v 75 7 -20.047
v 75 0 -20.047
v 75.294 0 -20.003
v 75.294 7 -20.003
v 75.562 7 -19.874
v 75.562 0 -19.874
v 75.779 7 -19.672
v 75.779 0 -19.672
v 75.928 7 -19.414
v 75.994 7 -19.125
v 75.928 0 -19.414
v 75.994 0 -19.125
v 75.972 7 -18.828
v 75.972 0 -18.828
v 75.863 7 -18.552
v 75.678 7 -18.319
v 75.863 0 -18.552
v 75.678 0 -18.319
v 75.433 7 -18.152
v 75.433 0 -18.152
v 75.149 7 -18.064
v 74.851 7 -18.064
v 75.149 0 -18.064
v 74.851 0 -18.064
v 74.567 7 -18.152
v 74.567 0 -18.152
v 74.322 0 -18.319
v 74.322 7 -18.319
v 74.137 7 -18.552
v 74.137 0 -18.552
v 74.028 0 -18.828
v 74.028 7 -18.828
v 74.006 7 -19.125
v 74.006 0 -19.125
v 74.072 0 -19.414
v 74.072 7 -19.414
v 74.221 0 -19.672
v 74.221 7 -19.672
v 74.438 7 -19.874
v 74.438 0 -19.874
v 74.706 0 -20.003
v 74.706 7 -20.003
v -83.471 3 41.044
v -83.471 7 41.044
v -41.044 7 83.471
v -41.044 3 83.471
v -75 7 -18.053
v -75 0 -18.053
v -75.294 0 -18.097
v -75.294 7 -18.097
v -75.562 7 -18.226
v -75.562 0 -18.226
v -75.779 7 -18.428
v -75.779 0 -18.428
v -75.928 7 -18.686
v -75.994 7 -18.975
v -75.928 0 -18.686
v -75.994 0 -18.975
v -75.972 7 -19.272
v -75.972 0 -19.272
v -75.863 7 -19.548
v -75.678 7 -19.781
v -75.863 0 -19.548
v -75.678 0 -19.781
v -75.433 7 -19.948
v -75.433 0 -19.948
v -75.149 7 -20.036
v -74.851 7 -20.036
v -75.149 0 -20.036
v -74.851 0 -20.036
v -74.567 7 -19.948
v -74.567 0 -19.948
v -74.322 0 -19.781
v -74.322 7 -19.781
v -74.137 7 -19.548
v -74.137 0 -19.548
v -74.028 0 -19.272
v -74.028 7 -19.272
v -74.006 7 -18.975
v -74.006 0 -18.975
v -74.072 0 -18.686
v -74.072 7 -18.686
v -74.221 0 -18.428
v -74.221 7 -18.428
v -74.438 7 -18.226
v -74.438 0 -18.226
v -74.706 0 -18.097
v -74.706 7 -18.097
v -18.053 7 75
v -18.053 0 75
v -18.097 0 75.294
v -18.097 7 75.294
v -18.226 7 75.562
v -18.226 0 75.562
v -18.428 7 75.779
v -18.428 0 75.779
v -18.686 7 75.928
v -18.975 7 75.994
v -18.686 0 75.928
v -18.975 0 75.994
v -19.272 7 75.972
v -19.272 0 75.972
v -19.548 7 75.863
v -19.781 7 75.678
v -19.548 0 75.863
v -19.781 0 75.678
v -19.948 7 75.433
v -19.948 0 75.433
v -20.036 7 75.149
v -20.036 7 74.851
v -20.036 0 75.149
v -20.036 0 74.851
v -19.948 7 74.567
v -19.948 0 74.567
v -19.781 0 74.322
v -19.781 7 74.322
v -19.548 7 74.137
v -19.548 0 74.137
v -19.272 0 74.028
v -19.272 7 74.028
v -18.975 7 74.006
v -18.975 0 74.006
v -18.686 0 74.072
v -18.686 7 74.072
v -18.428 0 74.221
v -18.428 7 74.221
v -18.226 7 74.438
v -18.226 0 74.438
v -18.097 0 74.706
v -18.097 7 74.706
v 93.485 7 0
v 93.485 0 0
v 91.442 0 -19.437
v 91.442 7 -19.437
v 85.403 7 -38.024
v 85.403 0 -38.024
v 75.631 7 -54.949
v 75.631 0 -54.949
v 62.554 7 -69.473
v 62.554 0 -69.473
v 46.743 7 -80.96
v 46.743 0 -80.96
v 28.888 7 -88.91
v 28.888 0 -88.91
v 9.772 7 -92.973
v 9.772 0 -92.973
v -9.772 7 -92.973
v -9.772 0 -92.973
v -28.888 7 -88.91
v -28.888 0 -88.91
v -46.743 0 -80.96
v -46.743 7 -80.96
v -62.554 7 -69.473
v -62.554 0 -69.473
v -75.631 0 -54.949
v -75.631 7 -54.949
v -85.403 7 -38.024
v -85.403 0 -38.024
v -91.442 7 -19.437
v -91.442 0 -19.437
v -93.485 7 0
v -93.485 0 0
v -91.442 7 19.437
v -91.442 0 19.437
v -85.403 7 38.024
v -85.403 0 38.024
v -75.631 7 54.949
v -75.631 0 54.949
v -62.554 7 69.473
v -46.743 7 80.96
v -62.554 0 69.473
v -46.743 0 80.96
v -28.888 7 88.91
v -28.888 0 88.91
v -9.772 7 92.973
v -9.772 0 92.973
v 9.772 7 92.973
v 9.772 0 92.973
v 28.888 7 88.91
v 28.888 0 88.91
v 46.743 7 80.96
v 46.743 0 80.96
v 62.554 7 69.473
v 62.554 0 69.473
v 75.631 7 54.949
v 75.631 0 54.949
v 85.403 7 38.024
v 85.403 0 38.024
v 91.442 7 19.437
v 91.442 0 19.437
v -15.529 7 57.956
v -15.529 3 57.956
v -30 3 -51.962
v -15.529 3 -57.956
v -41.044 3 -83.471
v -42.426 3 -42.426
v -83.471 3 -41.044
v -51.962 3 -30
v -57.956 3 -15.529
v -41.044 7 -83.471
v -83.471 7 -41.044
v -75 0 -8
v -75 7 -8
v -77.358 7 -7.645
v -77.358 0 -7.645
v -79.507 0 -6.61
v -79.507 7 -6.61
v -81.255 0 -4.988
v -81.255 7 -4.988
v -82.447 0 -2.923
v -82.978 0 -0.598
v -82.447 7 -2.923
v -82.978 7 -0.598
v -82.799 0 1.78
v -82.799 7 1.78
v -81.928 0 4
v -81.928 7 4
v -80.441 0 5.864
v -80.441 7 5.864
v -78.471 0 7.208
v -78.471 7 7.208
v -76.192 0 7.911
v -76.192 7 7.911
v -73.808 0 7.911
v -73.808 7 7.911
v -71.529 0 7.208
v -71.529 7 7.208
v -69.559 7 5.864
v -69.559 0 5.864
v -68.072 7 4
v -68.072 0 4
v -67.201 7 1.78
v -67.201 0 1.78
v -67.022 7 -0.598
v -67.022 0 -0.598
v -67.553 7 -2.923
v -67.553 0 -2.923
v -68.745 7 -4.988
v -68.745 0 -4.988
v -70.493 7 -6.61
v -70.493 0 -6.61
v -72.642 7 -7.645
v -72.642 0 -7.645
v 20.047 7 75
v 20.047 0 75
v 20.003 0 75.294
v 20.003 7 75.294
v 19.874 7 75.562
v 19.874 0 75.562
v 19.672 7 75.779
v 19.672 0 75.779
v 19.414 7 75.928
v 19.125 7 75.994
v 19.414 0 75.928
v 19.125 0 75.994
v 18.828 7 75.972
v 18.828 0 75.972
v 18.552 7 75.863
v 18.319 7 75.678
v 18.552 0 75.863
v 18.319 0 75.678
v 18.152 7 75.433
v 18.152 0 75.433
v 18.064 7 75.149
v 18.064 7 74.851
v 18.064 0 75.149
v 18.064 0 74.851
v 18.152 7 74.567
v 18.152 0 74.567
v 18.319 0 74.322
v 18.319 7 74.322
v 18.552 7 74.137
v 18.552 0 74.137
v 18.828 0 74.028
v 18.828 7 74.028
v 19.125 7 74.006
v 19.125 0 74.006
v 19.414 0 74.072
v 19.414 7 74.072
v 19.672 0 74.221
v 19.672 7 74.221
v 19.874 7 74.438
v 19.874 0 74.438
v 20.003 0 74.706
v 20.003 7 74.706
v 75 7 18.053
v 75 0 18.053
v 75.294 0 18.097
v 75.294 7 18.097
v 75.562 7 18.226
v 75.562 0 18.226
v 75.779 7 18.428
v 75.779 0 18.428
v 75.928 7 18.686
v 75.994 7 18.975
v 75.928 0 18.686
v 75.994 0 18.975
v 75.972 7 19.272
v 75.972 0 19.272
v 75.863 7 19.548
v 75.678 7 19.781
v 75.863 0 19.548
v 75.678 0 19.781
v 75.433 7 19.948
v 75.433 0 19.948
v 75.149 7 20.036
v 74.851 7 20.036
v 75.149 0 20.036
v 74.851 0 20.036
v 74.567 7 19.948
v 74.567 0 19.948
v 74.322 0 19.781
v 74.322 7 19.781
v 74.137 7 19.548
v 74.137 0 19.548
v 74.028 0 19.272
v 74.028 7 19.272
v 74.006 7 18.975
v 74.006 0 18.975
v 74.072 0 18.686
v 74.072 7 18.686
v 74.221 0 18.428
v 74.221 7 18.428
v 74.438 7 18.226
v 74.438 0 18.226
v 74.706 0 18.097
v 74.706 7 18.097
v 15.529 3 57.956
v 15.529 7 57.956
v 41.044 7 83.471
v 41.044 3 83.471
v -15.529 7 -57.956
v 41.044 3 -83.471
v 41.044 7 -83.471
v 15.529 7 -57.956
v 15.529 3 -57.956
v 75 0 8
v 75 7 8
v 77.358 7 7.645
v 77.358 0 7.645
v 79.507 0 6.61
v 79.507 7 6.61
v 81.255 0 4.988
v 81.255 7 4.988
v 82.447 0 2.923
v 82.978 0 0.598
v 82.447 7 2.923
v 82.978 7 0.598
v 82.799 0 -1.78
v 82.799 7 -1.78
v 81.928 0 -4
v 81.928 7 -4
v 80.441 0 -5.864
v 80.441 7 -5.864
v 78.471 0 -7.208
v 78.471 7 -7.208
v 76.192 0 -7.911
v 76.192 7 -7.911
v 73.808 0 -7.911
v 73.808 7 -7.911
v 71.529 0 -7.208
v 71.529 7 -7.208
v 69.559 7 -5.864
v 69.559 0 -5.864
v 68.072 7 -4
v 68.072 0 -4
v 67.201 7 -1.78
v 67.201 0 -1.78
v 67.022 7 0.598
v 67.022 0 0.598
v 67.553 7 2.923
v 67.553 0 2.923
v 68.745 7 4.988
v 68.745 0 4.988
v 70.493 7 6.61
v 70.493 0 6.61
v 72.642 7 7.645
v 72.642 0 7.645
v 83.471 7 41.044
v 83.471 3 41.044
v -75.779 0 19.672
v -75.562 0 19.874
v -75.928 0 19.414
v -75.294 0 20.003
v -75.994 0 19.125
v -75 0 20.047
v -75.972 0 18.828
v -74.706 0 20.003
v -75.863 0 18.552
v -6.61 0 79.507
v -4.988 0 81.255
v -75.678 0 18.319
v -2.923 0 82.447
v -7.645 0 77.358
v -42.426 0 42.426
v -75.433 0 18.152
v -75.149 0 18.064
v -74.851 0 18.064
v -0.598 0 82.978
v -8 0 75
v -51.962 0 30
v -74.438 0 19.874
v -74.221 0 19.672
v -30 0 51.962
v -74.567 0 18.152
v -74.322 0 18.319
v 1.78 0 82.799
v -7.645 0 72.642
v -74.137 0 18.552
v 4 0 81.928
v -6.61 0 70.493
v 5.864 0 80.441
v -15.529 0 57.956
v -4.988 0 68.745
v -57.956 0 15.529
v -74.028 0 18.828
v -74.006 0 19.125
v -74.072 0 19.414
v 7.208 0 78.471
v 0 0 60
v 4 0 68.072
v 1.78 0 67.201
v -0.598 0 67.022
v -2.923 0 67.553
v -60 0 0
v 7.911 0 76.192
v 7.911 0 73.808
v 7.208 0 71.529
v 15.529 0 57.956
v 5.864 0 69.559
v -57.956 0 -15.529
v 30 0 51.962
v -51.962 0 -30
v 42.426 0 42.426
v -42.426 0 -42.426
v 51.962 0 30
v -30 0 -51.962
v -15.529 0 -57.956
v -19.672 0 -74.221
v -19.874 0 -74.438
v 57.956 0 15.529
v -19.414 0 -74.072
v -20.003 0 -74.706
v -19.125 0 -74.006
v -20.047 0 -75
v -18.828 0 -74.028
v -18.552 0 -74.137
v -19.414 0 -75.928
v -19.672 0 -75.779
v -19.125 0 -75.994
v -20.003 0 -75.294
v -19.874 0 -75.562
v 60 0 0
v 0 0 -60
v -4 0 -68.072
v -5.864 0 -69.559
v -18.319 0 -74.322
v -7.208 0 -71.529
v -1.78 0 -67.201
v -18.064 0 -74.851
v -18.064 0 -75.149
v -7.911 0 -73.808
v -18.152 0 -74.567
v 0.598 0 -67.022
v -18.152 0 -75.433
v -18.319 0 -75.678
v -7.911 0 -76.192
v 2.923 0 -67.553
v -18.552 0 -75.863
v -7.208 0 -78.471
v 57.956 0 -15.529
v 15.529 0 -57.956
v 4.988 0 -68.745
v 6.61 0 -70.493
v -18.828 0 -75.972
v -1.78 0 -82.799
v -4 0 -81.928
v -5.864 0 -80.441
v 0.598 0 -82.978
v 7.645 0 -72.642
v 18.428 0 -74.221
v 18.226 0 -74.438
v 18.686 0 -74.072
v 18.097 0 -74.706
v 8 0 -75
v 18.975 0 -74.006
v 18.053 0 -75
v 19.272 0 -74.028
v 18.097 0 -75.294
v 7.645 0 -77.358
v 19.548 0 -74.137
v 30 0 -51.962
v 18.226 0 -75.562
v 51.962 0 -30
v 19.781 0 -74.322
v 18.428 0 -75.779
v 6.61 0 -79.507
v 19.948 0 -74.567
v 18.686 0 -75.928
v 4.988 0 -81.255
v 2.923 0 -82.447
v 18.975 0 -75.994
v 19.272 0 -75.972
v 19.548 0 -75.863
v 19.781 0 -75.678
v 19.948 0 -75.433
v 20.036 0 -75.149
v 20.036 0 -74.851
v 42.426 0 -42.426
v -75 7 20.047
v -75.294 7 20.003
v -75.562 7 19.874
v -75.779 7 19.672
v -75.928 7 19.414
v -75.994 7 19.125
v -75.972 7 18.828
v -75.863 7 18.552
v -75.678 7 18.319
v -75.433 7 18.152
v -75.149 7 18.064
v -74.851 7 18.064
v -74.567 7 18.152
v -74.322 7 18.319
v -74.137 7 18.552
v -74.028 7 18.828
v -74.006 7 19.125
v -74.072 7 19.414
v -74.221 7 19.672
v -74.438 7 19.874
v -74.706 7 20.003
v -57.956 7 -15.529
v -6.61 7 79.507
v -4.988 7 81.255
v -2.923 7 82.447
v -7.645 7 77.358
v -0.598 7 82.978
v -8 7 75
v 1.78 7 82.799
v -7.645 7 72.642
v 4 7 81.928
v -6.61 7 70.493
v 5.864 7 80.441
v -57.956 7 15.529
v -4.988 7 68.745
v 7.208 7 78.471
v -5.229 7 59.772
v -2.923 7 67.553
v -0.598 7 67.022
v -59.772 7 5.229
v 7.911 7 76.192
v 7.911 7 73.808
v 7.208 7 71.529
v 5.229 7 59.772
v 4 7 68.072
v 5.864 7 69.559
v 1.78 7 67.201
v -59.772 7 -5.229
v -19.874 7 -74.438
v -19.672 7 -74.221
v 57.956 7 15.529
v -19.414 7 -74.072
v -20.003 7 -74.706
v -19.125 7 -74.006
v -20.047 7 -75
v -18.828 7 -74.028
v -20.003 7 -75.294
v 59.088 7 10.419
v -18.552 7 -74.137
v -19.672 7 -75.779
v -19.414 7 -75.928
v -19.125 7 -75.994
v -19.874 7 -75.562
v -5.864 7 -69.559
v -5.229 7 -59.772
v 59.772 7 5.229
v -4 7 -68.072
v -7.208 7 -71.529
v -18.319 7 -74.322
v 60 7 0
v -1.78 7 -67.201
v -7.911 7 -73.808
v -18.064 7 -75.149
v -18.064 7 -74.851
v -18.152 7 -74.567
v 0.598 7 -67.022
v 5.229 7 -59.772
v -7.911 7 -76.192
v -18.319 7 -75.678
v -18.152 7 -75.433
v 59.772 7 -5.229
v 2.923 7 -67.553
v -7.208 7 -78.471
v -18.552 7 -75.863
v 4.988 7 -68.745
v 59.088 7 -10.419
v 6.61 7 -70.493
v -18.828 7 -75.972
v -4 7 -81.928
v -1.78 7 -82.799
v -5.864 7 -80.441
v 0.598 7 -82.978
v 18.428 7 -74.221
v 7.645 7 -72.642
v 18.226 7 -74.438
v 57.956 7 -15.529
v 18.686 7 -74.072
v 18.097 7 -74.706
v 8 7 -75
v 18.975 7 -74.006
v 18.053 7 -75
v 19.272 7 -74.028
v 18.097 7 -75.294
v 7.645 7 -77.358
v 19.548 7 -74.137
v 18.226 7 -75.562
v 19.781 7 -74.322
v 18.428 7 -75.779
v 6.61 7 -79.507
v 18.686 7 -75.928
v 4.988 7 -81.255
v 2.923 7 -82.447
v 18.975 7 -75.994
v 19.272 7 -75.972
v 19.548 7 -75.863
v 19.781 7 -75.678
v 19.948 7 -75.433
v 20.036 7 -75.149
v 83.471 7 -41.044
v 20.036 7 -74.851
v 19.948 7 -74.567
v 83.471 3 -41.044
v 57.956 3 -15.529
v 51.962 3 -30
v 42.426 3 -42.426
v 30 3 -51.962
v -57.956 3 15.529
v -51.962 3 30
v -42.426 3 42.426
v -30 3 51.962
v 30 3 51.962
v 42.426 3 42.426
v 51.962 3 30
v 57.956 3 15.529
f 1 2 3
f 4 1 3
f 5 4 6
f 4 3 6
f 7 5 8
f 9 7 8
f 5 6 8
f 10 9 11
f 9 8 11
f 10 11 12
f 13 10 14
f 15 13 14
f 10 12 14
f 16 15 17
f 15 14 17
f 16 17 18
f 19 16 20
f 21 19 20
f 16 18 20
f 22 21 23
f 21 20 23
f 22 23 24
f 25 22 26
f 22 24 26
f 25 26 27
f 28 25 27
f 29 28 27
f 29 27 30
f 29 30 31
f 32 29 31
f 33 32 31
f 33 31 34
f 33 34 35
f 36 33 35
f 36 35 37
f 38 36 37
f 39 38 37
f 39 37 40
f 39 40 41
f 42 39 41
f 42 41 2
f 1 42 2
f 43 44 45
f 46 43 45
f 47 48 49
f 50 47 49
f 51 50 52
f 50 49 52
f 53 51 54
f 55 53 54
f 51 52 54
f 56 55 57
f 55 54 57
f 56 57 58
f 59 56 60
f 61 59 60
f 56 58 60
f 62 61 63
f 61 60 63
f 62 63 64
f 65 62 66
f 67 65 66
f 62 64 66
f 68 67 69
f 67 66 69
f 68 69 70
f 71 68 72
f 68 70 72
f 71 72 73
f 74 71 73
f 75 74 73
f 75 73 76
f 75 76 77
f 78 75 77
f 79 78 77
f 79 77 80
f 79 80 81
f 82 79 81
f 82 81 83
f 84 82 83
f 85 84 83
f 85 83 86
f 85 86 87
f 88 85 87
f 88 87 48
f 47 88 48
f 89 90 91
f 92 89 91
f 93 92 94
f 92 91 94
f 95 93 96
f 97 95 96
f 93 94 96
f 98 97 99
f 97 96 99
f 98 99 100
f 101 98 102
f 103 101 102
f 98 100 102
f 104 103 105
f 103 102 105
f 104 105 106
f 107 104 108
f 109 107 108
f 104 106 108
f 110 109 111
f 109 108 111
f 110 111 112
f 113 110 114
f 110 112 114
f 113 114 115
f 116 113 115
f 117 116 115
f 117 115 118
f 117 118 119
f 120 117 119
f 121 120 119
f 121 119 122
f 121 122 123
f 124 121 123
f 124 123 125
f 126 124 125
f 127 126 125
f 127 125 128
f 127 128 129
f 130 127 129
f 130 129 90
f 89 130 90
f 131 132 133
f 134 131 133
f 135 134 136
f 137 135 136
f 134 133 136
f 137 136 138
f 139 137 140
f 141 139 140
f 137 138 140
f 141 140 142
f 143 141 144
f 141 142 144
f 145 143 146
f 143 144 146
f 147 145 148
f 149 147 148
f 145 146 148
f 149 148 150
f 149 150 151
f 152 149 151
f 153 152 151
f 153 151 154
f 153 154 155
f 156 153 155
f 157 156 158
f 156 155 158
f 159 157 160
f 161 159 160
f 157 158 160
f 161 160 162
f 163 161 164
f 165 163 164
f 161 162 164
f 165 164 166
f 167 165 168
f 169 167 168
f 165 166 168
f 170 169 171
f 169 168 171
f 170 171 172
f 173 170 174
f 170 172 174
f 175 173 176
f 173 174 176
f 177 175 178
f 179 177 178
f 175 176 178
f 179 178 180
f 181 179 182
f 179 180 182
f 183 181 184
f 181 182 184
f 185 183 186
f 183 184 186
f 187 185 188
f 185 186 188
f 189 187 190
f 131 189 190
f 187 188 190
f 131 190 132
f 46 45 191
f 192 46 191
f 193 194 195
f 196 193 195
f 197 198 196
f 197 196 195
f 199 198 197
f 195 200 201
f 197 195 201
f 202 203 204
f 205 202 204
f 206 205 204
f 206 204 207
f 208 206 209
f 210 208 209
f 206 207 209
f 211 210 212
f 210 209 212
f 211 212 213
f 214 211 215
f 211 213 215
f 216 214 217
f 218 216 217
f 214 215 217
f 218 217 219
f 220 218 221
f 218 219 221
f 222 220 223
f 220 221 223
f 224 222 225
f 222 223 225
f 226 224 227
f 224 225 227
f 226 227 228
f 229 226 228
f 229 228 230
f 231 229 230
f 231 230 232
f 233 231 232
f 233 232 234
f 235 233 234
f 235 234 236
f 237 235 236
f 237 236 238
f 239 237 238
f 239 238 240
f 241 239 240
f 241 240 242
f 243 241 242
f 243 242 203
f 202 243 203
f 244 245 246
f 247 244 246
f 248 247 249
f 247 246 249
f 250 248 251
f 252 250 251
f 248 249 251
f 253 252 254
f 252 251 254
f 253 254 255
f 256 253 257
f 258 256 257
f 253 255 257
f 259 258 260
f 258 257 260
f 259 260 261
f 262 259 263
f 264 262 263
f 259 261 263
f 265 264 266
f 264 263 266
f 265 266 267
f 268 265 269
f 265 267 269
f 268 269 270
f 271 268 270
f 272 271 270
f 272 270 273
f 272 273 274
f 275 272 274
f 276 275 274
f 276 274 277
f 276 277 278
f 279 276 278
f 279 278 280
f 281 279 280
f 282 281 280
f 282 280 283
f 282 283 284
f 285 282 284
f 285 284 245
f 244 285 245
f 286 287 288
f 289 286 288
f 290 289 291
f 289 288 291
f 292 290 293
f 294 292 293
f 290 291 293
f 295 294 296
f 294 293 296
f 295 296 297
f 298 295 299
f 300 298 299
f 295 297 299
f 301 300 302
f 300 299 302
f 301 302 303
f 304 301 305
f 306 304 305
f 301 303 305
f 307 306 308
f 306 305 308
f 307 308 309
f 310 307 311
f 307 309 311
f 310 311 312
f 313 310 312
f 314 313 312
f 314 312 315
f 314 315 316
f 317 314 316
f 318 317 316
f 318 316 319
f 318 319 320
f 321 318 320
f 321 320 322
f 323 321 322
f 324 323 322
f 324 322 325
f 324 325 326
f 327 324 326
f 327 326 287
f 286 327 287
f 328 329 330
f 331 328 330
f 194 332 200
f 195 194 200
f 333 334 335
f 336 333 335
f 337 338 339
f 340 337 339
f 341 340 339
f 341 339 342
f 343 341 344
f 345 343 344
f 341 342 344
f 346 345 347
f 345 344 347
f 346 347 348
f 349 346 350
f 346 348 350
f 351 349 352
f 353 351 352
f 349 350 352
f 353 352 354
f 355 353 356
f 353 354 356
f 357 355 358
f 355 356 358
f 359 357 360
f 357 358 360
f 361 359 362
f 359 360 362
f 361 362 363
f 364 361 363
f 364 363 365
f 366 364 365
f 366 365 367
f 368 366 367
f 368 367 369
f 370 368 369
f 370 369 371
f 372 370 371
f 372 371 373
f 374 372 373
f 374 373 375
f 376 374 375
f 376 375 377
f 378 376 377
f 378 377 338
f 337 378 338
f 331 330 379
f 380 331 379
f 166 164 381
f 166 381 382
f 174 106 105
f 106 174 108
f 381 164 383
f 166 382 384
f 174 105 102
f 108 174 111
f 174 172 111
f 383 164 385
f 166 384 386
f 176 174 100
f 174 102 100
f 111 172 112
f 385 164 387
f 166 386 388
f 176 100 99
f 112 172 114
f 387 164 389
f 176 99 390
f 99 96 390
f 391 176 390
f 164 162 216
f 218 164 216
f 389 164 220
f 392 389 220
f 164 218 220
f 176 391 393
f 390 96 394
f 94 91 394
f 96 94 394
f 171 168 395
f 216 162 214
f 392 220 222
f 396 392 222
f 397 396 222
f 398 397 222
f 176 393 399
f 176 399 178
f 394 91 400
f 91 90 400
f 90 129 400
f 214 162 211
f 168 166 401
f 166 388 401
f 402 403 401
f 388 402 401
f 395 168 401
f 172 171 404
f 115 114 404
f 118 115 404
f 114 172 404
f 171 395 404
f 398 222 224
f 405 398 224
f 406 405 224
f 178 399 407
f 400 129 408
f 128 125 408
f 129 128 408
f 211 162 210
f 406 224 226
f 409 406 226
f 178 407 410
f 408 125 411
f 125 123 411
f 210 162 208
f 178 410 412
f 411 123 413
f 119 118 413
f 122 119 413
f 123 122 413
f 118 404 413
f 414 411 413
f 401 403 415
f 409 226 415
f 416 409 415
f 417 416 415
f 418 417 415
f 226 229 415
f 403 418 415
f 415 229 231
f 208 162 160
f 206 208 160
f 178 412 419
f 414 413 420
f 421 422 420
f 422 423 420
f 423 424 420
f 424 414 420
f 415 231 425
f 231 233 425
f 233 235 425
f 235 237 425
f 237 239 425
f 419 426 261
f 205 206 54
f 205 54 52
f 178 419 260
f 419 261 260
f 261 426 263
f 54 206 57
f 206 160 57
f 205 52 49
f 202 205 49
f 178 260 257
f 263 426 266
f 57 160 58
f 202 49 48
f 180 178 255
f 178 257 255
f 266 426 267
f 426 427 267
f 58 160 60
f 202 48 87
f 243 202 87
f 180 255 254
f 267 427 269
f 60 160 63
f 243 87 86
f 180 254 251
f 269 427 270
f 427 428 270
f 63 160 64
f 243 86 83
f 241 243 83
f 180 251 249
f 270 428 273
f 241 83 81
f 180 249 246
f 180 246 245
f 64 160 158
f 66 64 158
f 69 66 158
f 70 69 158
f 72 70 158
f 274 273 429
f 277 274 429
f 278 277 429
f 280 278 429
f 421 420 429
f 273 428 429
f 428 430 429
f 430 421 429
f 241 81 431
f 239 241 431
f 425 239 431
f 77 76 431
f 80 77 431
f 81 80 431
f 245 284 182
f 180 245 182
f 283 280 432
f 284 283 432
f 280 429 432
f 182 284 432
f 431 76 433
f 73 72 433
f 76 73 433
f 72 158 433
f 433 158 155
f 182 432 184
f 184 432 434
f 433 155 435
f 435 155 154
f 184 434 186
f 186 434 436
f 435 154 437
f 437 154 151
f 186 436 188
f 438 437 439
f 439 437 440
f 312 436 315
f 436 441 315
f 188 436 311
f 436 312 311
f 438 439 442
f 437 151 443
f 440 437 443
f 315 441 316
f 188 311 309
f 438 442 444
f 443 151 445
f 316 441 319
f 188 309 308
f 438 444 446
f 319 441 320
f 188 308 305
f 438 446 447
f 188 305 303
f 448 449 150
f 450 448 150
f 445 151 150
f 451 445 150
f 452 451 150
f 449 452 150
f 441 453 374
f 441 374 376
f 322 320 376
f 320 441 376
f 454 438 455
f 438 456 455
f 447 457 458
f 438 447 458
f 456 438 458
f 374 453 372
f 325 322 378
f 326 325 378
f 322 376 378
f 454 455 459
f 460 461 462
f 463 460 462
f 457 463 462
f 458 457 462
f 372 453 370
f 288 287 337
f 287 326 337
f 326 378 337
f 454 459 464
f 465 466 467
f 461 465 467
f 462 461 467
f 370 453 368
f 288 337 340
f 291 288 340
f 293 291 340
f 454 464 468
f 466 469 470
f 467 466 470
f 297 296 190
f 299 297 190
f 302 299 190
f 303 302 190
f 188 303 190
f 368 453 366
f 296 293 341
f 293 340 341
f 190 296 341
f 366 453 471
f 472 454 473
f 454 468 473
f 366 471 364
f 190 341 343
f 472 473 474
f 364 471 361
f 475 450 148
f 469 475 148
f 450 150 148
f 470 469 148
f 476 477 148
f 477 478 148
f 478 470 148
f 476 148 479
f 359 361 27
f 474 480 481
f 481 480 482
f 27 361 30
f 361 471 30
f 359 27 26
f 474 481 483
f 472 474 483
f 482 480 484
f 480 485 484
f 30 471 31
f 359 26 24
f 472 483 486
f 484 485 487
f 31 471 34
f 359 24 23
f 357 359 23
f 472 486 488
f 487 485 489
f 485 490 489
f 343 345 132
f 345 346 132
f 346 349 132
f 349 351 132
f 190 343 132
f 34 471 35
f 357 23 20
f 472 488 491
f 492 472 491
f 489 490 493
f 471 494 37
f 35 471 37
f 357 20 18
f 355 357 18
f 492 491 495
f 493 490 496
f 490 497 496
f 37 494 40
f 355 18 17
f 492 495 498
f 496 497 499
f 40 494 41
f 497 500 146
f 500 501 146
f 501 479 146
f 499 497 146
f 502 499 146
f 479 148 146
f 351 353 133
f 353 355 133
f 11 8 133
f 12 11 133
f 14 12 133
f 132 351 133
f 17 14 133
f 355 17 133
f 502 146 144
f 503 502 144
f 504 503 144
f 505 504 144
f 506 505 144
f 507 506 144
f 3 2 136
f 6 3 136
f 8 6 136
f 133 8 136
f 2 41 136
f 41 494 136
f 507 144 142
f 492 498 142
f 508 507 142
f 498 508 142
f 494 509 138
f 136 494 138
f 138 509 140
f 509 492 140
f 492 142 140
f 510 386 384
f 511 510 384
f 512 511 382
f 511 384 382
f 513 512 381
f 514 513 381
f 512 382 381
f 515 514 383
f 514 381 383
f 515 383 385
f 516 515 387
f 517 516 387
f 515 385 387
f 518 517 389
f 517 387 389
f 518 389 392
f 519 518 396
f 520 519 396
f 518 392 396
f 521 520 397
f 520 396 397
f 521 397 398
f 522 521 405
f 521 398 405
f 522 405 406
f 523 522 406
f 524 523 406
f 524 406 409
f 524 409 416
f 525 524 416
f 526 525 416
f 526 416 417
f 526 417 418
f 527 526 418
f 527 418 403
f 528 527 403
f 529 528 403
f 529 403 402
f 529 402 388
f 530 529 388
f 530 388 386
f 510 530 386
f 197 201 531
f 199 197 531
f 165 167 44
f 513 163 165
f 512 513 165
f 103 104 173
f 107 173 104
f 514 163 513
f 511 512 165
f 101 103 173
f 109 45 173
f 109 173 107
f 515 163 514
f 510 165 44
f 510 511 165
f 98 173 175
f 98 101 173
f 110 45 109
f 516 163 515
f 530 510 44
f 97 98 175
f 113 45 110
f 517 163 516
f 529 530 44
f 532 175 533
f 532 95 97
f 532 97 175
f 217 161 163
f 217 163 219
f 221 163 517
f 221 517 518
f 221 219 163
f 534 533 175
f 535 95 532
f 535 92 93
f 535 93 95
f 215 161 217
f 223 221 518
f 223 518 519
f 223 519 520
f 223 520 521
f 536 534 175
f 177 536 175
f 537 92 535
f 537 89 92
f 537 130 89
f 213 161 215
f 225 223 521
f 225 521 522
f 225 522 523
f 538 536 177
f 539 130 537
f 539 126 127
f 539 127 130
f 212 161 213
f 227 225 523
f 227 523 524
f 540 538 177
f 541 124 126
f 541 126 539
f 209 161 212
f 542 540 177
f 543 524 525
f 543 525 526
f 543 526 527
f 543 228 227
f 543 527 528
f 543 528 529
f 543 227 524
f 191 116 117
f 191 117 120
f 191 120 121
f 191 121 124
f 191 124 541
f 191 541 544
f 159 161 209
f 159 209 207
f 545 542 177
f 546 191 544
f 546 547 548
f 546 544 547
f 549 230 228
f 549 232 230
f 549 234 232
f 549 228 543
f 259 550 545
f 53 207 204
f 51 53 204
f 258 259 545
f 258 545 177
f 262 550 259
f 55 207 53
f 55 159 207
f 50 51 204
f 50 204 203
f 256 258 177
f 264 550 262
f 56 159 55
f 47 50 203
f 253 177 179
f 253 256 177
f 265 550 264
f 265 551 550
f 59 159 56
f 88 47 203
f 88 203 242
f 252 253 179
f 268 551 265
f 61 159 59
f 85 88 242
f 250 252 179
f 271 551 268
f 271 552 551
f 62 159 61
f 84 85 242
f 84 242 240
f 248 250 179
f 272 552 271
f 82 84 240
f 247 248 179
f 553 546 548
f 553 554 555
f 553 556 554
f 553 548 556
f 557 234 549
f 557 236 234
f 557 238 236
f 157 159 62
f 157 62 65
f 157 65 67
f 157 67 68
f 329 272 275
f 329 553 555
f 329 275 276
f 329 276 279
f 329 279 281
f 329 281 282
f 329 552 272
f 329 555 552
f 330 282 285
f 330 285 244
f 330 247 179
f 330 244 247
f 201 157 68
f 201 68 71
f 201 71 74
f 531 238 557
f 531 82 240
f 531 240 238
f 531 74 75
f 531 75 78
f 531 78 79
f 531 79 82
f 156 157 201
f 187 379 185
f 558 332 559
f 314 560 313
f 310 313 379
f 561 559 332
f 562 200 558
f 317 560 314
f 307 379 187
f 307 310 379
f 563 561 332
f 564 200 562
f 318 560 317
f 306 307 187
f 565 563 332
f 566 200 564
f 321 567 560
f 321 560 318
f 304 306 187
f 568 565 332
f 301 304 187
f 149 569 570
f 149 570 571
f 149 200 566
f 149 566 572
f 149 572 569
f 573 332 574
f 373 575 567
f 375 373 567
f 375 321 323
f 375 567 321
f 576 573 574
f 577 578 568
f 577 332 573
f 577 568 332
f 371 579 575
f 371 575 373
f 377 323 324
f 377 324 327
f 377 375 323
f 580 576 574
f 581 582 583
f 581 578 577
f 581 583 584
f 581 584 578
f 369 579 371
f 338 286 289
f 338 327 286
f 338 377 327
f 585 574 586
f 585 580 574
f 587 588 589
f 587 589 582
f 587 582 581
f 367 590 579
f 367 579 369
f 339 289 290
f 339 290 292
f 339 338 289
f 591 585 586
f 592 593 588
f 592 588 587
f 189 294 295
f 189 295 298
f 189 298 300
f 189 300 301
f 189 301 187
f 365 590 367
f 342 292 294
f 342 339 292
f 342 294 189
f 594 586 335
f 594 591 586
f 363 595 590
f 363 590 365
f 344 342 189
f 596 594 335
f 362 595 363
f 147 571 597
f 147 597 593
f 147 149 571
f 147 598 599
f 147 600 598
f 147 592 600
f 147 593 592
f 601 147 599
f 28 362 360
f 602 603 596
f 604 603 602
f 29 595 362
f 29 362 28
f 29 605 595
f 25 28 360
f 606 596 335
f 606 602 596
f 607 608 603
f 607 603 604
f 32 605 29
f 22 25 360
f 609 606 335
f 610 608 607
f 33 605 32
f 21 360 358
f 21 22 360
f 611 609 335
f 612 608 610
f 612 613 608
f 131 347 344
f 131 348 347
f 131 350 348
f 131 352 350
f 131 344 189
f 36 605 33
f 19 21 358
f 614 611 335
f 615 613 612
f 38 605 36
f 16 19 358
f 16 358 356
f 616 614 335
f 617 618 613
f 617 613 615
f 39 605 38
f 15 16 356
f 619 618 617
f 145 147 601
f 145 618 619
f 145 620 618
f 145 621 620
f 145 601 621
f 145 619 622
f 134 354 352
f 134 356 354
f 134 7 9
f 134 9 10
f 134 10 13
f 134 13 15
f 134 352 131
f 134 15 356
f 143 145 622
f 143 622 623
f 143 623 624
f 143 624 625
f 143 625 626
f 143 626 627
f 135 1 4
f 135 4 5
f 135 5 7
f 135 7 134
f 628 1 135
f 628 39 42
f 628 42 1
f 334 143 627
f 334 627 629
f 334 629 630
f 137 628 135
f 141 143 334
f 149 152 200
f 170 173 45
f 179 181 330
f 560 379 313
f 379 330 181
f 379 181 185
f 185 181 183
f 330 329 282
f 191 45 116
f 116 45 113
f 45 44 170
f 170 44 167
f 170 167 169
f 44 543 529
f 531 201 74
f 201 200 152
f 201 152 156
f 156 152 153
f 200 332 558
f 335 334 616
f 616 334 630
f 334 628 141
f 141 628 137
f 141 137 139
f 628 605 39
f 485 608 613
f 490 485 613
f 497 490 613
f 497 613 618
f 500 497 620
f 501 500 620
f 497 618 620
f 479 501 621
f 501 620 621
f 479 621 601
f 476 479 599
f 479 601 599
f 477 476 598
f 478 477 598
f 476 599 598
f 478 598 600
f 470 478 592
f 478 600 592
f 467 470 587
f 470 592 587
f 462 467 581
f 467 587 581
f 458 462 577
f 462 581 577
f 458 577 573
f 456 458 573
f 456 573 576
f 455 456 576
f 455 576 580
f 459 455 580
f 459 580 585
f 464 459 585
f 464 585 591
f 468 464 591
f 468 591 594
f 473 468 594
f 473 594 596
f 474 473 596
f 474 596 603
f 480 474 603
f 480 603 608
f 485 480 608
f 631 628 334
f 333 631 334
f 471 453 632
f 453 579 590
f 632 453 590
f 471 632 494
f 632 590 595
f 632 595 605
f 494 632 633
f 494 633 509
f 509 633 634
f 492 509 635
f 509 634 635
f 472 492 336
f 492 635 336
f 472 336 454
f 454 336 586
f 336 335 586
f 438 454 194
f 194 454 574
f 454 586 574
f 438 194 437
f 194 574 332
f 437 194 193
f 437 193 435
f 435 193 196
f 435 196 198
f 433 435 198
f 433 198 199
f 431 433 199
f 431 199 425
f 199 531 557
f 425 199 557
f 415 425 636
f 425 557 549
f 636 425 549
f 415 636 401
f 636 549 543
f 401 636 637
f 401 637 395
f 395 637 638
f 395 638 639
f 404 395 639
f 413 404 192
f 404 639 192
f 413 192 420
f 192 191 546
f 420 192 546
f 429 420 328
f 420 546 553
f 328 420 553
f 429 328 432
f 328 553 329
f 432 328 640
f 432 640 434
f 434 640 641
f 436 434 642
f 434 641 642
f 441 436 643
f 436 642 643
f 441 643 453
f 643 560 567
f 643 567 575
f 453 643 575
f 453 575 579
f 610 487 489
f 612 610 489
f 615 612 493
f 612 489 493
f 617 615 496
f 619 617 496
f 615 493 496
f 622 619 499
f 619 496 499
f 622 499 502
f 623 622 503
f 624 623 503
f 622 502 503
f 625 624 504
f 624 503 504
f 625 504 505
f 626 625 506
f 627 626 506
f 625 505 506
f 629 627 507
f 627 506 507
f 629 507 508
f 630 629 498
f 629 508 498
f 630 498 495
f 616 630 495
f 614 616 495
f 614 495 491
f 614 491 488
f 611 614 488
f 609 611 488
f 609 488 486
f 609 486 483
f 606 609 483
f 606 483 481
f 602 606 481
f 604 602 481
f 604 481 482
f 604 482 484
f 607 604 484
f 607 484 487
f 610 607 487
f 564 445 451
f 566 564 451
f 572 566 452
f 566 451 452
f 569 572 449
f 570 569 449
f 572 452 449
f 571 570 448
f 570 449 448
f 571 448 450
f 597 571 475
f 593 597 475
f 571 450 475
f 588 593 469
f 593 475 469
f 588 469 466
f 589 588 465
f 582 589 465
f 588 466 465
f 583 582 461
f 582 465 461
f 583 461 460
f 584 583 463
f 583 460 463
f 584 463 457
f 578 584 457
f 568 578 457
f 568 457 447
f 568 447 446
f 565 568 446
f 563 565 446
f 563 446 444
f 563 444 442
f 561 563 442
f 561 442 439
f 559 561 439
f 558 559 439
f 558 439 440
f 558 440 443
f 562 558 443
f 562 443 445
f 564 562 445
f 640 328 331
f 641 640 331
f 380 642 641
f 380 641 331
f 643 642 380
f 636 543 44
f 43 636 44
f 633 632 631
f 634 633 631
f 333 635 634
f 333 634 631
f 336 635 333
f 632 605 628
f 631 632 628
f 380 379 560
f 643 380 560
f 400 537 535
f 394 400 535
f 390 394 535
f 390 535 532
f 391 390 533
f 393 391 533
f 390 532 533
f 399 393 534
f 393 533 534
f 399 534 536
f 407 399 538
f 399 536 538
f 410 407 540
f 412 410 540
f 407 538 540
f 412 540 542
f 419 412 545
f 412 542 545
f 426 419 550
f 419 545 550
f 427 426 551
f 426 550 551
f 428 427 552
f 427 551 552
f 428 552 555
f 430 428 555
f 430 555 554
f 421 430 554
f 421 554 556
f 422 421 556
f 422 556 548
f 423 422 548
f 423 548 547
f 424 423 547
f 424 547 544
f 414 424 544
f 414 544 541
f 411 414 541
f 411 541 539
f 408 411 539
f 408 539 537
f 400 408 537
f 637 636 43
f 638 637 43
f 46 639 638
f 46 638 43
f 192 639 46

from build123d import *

# Parameters (mm, degrees)
SKETCH2_R             = 93.485122645
EXTRUDE1_DEPTH        = 7
SKETCH3_R             = 8
CUT_EXTRUDE1_DEPTH    = 8
F_3_48_TAPPED_HOLE1_D = 1.9939
CIRPATTERN1_COUNT     = 4
SKETCH8_R             = 60
CUT_EXTRUDE2_DEPTH    = 8
SKETCH9_R             = 60
CUT_EXTRUDE10_DEPTH   = 4
CIRPATTERN4_COUNT     = 4


with BuildPart() as part:
    # Sketch2 → Extrude1 (new body)
    with BuildSketch(Plane(origin=(0, 0, 0), x_dir=(1, 0, 0), z_dir=(0, 1, 0))):
        Circle(SKETCH2_R)
    extrude(amount=EXTRUDE1_DEPTH)

    # Sketch3 → Cut-Extrude1 (cut, through all)
    with BuildSketch(Plane(origin=(0, 7, 0), x_dir=(1, 0, 0), z_dir=(0, 1, 0))):
        with Locations((0, 75)):
            Circle(SKETCH3_R)
    cut_extrude1 = extrude(amount=-CUT_EXTRUDE1_DEPTH, mode=Mode.SUBTRACT)

    # #3-48 Tapped Hole1 (through all)
    with Locations(Plane(origin=(0, 7, 0), x_dir=(1, 0, 0), z_dir=(0, 1, 0))):
        with Locations((-19.05, 75), (19.05, 75)):
            f_3_48_tapped_hole1 = Hole(F_3_48_TAPPED_HOLE1_D / 2)

    # CirPattern1: Cut-Extrude1, #3-48 Tapped Hole1 ×4 about axis
    cirpattern1_axis = Axis((0, 0, 0), (0, 1, 0))
    for i in range(1, CIRPATTERN1_COUNT):
        add(cut_extrude1.rotate(cirpattern1_axis, i * 360 / CIRPATTERN1_COUNT), mode=Mode.SUBTRACT)
        add(f_3_48_tapped_hole1.rotate(cirpattern1_axis, i * 360 / CIRPATTERN1_COUNT), mode=Mode.SUBTRACT)

    # Sketch8 → Cut-Extrude2 (cut, through all)
    with BuildSketch(Plane(origin=(0, 7, 0), x_dir=(1, 0, 0), z_dir=(0, 1, 0))):
        Circle(SKETCH8_R)
    extrude(amount=-CUT_EXTRUDE2_DEPTH, mode=Mode.SUBTRACT)

    # Sketch9 → Cut-Extrude10 (cut)
    with BuildSketch(Plane(origin=(0, 7, 0), x_dir=(1, 0, 0), z_dir=(0, 1, 0))):
        Circle(SKETCH9_R)
        Polygon((41.044204571, -83.470611442), (83.470611442, -41.044204571), (42.459618294, -0.033211423), (-0.033211423, -42.393195448), align=None)
    cut_extrude10 = extrude(amount=-CUT_EXTRUDE10_DEPTH, mode=Mode.SUBTRACT)

    # CirPattern4: Cut-Extrude10 ×4 about axis
    cirpattern4_axis = Axis((0, 0, 0), (0, 1, 0))
    for i in range(1, CIRPATTERN4_COUNT):
        add(cut_extrude10.rotate(cirpattern4_axis, i * 360 / CIRPATTERN4_COUNT), mode=Mode.SUBTRACT)


solid = part.part
